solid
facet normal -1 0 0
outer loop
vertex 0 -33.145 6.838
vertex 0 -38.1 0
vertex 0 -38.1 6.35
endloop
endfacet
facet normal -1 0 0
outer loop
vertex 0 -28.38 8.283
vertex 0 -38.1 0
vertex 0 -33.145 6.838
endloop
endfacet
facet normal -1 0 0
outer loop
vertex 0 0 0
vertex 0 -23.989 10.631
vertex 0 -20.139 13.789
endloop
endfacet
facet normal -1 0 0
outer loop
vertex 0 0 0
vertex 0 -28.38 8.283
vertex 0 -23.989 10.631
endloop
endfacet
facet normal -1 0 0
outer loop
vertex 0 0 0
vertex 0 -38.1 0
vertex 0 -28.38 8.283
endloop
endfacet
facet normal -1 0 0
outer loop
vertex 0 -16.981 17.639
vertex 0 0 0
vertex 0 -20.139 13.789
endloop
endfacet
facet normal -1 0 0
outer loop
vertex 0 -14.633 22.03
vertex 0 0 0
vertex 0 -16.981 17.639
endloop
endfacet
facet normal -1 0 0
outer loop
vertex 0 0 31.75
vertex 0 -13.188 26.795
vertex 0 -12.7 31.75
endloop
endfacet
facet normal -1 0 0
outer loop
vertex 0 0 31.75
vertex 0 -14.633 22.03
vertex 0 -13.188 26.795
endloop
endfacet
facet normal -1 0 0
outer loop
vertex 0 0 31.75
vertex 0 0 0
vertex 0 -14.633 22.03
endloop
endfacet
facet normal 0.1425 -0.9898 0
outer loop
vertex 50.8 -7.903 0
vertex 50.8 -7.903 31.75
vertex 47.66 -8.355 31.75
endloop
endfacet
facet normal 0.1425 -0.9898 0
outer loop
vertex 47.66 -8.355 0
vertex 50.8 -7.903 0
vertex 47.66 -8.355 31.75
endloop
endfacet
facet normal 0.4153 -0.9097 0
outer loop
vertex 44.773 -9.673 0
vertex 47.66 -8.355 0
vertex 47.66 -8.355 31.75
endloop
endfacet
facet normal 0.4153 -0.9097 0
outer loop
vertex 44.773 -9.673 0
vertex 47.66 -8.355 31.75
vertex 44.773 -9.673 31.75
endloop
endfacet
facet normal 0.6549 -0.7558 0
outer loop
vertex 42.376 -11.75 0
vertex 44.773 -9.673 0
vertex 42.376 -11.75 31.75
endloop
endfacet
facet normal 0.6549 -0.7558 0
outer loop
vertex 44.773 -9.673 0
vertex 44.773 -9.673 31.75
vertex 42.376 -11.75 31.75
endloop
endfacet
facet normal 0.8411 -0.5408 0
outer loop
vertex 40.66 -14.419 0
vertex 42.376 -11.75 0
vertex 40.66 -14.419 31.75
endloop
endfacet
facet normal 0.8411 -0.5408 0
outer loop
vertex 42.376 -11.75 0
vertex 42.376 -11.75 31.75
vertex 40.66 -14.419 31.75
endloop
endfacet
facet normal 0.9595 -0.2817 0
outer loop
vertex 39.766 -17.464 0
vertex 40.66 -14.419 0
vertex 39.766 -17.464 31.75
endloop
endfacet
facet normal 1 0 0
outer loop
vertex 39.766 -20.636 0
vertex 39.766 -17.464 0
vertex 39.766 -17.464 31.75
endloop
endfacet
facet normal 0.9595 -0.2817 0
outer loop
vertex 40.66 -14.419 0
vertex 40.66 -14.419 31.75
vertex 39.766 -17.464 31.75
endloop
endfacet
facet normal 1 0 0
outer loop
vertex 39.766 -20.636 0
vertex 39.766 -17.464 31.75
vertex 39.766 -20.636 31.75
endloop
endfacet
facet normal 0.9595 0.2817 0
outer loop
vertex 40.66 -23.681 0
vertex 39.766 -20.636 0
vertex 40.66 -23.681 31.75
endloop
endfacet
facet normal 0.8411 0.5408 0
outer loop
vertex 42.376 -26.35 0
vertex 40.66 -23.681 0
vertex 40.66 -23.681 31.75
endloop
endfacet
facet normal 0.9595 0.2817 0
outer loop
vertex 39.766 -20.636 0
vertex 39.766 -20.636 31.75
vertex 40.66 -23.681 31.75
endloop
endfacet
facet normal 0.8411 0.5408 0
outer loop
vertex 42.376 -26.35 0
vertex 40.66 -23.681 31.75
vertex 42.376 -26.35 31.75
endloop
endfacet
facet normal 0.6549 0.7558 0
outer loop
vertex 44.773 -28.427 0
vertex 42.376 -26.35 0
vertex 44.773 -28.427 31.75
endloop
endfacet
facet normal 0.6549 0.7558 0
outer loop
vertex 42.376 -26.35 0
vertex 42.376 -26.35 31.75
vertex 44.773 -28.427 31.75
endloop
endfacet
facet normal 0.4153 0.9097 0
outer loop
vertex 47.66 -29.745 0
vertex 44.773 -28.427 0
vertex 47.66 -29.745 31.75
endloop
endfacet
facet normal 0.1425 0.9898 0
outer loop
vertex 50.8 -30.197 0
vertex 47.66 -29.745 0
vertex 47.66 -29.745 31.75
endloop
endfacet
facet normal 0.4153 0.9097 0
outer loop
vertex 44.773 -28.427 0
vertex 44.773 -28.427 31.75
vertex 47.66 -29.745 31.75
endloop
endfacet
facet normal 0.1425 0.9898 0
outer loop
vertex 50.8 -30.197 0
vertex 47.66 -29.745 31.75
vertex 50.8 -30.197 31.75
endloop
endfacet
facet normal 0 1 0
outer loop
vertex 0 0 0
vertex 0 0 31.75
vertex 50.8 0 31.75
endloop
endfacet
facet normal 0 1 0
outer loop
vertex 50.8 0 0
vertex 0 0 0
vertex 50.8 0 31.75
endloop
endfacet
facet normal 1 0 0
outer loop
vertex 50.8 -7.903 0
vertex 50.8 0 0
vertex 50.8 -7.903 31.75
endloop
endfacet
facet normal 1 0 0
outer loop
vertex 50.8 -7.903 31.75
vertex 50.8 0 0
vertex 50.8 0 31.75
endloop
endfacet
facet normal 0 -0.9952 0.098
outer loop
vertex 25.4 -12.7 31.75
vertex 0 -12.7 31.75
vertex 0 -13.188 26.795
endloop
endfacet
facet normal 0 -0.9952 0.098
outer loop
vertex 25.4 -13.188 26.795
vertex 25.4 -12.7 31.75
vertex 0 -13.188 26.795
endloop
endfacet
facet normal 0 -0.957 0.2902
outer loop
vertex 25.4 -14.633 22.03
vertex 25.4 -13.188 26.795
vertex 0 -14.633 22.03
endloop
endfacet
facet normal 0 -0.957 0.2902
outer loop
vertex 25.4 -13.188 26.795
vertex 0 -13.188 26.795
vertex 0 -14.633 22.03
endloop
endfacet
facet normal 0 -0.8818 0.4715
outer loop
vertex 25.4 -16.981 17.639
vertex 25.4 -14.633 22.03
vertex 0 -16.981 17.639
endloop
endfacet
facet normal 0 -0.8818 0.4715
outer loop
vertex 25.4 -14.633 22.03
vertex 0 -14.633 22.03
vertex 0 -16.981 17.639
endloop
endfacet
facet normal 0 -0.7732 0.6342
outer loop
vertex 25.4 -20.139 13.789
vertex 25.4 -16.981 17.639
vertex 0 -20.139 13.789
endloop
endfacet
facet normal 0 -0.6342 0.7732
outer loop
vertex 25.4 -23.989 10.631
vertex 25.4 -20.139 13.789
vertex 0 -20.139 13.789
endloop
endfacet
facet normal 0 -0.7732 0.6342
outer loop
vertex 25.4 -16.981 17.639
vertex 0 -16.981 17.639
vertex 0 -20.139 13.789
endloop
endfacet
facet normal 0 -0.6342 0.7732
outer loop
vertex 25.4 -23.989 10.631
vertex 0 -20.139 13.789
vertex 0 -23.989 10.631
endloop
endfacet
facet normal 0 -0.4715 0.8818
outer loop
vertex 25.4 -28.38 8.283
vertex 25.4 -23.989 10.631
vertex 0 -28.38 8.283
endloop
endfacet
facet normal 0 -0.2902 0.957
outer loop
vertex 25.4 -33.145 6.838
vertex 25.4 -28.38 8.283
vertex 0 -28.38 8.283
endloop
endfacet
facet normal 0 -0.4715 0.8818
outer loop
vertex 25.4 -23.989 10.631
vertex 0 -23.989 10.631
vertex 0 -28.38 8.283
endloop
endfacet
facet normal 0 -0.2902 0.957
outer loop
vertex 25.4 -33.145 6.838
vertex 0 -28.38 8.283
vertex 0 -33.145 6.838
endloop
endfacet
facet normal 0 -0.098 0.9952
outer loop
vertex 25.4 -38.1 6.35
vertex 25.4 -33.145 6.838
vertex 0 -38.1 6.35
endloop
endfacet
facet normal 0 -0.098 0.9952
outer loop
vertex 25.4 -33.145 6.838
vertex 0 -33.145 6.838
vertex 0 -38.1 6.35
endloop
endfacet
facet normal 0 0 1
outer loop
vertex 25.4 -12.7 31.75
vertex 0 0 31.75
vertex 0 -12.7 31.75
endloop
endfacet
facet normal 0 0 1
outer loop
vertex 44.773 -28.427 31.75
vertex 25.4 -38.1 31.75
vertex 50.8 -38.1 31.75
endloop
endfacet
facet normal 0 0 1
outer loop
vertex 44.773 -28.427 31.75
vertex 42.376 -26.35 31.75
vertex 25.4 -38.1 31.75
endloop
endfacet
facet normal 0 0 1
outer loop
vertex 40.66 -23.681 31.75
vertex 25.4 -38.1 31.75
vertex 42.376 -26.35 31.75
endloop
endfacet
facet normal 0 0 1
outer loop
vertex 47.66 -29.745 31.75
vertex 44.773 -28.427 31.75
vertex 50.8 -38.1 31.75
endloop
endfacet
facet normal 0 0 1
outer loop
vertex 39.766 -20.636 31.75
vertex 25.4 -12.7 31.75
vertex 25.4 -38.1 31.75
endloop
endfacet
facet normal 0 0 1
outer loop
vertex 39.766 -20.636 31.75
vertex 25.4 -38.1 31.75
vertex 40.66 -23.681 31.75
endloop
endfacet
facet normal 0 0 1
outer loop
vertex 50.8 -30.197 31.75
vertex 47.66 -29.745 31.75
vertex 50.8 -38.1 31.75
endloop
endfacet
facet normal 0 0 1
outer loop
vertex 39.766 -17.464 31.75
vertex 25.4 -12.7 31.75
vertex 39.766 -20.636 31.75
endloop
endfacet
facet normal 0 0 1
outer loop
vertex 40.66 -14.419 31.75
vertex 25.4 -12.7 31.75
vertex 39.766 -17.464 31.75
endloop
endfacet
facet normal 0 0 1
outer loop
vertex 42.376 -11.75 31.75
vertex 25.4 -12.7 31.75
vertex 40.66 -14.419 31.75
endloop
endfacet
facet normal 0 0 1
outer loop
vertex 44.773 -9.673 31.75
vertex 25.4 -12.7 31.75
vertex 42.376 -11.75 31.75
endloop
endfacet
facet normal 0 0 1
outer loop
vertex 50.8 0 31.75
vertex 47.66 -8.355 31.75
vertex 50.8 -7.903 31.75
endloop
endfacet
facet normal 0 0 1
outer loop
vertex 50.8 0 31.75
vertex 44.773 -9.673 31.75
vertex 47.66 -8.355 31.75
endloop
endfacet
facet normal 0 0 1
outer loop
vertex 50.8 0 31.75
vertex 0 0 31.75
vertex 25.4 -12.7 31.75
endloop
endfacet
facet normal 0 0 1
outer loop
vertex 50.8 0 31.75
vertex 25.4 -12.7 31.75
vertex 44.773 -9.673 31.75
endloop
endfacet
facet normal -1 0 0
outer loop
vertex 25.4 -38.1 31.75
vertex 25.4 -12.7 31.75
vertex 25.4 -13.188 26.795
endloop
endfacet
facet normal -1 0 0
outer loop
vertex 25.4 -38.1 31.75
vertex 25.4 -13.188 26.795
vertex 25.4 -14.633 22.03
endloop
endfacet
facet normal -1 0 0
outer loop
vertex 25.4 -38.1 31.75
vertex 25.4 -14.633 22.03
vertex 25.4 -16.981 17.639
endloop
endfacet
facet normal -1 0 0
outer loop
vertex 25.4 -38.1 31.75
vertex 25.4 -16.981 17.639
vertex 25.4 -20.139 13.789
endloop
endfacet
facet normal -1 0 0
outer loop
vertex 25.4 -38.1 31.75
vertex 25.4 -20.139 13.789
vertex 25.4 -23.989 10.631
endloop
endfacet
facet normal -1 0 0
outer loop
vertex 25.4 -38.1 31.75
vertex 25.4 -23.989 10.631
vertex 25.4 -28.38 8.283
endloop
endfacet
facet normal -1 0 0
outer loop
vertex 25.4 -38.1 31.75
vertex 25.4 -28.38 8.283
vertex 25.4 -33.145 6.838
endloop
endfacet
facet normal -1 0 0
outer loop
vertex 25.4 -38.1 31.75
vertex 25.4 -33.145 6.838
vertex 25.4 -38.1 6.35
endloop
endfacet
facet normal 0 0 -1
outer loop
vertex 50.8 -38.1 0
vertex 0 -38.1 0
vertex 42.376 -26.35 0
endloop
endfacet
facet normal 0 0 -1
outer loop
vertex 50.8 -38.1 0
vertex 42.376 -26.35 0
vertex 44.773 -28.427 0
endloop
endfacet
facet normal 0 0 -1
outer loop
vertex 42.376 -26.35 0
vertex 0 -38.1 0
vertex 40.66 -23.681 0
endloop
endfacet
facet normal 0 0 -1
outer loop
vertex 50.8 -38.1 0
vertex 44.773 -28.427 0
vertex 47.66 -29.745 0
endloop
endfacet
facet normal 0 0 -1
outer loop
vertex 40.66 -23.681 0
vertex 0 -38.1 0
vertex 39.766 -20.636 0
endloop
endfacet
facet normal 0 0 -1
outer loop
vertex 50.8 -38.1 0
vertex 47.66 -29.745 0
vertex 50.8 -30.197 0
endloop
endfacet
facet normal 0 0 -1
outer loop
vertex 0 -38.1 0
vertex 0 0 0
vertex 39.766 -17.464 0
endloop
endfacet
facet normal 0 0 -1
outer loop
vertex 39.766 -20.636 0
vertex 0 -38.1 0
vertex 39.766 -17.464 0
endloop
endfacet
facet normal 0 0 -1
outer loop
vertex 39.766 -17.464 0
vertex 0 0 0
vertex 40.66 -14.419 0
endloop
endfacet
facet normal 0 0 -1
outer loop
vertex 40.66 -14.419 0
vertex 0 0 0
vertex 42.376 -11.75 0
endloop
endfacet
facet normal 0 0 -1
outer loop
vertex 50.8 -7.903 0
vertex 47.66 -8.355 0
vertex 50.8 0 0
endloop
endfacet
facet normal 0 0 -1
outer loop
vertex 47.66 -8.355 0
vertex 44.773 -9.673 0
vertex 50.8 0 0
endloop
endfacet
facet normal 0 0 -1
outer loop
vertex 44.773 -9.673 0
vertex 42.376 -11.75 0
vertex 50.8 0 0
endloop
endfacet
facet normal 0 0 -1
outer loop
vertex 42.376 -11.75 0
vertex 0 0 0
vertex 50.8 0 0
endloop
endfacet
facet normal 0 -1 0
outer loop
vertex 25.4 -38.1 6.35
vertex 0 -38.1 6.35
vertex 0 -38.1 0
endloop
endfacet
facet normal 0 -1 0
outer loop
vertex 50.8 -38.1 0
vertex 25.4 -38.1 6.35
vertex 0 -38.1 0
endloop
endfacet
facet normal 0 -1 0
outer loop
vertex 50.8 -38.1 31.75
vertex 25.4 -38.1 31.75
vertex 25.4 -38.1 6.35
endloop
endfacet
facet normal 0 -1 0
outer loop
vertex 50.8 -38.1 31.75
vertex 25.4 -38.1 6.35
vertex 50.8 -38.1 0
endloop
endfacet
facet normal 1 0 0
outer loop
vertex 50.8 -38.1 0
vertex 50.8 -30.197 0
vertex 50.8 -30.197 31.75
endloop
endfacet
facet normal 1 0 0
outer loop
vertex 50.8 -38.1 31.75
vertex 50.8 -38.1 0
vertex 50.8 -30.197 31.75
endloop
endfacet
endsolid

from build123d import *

# Parameters (mm, degrees)
F0_W     = 50.8
F0_H     = 31.75
F1_DEPTH = 38.1
F3_DEPTH = 31.75
F5_DEPTH = 25.4


with BuildPart() as f1:
    # F0 (on Front) → F1 (new body)
    with BuildSketch(Plane.XZ):
        with Locations((25.4, 15.875)):
            Rectangle(F0_W, F0_H)
    extrude(amount=F1_DEPTH)

    # F2 (on face) → F3 (cut)
    with BuildSketch(Plane.XY.offset(31.75)):
        with BuildLine():
            Line((50.8, -30.196967), (50.8, -7.903033))
            ThreePointArc((50.8, -7.903033), (39.653033, -19.05), (50.8, -30.196967))
        make_face()
    extrude(amount=-F3_DEPTH, mode=Mode.SUBTRACT)

    # F4 (on face) → F5 (cut)
    with BuildSketch(Plane(origin=(0, 0, 0), x_dir=(0, -1, 0), z_dir=(-1, 0, 0))):
        with BuildLine():
            Line((38.1, 31.75), (12.7, 31.75))
            ThreePointArc((12.7, 31.75), (20.139488, 13.789488), (38.1, 6.35))
            Line((38.1, 6.35), (38.1, 31.75))
        make_face()
    extrude(amount=-F5_DEPTH, mode=Mode.SUBTRACT)


solid = f1.part
